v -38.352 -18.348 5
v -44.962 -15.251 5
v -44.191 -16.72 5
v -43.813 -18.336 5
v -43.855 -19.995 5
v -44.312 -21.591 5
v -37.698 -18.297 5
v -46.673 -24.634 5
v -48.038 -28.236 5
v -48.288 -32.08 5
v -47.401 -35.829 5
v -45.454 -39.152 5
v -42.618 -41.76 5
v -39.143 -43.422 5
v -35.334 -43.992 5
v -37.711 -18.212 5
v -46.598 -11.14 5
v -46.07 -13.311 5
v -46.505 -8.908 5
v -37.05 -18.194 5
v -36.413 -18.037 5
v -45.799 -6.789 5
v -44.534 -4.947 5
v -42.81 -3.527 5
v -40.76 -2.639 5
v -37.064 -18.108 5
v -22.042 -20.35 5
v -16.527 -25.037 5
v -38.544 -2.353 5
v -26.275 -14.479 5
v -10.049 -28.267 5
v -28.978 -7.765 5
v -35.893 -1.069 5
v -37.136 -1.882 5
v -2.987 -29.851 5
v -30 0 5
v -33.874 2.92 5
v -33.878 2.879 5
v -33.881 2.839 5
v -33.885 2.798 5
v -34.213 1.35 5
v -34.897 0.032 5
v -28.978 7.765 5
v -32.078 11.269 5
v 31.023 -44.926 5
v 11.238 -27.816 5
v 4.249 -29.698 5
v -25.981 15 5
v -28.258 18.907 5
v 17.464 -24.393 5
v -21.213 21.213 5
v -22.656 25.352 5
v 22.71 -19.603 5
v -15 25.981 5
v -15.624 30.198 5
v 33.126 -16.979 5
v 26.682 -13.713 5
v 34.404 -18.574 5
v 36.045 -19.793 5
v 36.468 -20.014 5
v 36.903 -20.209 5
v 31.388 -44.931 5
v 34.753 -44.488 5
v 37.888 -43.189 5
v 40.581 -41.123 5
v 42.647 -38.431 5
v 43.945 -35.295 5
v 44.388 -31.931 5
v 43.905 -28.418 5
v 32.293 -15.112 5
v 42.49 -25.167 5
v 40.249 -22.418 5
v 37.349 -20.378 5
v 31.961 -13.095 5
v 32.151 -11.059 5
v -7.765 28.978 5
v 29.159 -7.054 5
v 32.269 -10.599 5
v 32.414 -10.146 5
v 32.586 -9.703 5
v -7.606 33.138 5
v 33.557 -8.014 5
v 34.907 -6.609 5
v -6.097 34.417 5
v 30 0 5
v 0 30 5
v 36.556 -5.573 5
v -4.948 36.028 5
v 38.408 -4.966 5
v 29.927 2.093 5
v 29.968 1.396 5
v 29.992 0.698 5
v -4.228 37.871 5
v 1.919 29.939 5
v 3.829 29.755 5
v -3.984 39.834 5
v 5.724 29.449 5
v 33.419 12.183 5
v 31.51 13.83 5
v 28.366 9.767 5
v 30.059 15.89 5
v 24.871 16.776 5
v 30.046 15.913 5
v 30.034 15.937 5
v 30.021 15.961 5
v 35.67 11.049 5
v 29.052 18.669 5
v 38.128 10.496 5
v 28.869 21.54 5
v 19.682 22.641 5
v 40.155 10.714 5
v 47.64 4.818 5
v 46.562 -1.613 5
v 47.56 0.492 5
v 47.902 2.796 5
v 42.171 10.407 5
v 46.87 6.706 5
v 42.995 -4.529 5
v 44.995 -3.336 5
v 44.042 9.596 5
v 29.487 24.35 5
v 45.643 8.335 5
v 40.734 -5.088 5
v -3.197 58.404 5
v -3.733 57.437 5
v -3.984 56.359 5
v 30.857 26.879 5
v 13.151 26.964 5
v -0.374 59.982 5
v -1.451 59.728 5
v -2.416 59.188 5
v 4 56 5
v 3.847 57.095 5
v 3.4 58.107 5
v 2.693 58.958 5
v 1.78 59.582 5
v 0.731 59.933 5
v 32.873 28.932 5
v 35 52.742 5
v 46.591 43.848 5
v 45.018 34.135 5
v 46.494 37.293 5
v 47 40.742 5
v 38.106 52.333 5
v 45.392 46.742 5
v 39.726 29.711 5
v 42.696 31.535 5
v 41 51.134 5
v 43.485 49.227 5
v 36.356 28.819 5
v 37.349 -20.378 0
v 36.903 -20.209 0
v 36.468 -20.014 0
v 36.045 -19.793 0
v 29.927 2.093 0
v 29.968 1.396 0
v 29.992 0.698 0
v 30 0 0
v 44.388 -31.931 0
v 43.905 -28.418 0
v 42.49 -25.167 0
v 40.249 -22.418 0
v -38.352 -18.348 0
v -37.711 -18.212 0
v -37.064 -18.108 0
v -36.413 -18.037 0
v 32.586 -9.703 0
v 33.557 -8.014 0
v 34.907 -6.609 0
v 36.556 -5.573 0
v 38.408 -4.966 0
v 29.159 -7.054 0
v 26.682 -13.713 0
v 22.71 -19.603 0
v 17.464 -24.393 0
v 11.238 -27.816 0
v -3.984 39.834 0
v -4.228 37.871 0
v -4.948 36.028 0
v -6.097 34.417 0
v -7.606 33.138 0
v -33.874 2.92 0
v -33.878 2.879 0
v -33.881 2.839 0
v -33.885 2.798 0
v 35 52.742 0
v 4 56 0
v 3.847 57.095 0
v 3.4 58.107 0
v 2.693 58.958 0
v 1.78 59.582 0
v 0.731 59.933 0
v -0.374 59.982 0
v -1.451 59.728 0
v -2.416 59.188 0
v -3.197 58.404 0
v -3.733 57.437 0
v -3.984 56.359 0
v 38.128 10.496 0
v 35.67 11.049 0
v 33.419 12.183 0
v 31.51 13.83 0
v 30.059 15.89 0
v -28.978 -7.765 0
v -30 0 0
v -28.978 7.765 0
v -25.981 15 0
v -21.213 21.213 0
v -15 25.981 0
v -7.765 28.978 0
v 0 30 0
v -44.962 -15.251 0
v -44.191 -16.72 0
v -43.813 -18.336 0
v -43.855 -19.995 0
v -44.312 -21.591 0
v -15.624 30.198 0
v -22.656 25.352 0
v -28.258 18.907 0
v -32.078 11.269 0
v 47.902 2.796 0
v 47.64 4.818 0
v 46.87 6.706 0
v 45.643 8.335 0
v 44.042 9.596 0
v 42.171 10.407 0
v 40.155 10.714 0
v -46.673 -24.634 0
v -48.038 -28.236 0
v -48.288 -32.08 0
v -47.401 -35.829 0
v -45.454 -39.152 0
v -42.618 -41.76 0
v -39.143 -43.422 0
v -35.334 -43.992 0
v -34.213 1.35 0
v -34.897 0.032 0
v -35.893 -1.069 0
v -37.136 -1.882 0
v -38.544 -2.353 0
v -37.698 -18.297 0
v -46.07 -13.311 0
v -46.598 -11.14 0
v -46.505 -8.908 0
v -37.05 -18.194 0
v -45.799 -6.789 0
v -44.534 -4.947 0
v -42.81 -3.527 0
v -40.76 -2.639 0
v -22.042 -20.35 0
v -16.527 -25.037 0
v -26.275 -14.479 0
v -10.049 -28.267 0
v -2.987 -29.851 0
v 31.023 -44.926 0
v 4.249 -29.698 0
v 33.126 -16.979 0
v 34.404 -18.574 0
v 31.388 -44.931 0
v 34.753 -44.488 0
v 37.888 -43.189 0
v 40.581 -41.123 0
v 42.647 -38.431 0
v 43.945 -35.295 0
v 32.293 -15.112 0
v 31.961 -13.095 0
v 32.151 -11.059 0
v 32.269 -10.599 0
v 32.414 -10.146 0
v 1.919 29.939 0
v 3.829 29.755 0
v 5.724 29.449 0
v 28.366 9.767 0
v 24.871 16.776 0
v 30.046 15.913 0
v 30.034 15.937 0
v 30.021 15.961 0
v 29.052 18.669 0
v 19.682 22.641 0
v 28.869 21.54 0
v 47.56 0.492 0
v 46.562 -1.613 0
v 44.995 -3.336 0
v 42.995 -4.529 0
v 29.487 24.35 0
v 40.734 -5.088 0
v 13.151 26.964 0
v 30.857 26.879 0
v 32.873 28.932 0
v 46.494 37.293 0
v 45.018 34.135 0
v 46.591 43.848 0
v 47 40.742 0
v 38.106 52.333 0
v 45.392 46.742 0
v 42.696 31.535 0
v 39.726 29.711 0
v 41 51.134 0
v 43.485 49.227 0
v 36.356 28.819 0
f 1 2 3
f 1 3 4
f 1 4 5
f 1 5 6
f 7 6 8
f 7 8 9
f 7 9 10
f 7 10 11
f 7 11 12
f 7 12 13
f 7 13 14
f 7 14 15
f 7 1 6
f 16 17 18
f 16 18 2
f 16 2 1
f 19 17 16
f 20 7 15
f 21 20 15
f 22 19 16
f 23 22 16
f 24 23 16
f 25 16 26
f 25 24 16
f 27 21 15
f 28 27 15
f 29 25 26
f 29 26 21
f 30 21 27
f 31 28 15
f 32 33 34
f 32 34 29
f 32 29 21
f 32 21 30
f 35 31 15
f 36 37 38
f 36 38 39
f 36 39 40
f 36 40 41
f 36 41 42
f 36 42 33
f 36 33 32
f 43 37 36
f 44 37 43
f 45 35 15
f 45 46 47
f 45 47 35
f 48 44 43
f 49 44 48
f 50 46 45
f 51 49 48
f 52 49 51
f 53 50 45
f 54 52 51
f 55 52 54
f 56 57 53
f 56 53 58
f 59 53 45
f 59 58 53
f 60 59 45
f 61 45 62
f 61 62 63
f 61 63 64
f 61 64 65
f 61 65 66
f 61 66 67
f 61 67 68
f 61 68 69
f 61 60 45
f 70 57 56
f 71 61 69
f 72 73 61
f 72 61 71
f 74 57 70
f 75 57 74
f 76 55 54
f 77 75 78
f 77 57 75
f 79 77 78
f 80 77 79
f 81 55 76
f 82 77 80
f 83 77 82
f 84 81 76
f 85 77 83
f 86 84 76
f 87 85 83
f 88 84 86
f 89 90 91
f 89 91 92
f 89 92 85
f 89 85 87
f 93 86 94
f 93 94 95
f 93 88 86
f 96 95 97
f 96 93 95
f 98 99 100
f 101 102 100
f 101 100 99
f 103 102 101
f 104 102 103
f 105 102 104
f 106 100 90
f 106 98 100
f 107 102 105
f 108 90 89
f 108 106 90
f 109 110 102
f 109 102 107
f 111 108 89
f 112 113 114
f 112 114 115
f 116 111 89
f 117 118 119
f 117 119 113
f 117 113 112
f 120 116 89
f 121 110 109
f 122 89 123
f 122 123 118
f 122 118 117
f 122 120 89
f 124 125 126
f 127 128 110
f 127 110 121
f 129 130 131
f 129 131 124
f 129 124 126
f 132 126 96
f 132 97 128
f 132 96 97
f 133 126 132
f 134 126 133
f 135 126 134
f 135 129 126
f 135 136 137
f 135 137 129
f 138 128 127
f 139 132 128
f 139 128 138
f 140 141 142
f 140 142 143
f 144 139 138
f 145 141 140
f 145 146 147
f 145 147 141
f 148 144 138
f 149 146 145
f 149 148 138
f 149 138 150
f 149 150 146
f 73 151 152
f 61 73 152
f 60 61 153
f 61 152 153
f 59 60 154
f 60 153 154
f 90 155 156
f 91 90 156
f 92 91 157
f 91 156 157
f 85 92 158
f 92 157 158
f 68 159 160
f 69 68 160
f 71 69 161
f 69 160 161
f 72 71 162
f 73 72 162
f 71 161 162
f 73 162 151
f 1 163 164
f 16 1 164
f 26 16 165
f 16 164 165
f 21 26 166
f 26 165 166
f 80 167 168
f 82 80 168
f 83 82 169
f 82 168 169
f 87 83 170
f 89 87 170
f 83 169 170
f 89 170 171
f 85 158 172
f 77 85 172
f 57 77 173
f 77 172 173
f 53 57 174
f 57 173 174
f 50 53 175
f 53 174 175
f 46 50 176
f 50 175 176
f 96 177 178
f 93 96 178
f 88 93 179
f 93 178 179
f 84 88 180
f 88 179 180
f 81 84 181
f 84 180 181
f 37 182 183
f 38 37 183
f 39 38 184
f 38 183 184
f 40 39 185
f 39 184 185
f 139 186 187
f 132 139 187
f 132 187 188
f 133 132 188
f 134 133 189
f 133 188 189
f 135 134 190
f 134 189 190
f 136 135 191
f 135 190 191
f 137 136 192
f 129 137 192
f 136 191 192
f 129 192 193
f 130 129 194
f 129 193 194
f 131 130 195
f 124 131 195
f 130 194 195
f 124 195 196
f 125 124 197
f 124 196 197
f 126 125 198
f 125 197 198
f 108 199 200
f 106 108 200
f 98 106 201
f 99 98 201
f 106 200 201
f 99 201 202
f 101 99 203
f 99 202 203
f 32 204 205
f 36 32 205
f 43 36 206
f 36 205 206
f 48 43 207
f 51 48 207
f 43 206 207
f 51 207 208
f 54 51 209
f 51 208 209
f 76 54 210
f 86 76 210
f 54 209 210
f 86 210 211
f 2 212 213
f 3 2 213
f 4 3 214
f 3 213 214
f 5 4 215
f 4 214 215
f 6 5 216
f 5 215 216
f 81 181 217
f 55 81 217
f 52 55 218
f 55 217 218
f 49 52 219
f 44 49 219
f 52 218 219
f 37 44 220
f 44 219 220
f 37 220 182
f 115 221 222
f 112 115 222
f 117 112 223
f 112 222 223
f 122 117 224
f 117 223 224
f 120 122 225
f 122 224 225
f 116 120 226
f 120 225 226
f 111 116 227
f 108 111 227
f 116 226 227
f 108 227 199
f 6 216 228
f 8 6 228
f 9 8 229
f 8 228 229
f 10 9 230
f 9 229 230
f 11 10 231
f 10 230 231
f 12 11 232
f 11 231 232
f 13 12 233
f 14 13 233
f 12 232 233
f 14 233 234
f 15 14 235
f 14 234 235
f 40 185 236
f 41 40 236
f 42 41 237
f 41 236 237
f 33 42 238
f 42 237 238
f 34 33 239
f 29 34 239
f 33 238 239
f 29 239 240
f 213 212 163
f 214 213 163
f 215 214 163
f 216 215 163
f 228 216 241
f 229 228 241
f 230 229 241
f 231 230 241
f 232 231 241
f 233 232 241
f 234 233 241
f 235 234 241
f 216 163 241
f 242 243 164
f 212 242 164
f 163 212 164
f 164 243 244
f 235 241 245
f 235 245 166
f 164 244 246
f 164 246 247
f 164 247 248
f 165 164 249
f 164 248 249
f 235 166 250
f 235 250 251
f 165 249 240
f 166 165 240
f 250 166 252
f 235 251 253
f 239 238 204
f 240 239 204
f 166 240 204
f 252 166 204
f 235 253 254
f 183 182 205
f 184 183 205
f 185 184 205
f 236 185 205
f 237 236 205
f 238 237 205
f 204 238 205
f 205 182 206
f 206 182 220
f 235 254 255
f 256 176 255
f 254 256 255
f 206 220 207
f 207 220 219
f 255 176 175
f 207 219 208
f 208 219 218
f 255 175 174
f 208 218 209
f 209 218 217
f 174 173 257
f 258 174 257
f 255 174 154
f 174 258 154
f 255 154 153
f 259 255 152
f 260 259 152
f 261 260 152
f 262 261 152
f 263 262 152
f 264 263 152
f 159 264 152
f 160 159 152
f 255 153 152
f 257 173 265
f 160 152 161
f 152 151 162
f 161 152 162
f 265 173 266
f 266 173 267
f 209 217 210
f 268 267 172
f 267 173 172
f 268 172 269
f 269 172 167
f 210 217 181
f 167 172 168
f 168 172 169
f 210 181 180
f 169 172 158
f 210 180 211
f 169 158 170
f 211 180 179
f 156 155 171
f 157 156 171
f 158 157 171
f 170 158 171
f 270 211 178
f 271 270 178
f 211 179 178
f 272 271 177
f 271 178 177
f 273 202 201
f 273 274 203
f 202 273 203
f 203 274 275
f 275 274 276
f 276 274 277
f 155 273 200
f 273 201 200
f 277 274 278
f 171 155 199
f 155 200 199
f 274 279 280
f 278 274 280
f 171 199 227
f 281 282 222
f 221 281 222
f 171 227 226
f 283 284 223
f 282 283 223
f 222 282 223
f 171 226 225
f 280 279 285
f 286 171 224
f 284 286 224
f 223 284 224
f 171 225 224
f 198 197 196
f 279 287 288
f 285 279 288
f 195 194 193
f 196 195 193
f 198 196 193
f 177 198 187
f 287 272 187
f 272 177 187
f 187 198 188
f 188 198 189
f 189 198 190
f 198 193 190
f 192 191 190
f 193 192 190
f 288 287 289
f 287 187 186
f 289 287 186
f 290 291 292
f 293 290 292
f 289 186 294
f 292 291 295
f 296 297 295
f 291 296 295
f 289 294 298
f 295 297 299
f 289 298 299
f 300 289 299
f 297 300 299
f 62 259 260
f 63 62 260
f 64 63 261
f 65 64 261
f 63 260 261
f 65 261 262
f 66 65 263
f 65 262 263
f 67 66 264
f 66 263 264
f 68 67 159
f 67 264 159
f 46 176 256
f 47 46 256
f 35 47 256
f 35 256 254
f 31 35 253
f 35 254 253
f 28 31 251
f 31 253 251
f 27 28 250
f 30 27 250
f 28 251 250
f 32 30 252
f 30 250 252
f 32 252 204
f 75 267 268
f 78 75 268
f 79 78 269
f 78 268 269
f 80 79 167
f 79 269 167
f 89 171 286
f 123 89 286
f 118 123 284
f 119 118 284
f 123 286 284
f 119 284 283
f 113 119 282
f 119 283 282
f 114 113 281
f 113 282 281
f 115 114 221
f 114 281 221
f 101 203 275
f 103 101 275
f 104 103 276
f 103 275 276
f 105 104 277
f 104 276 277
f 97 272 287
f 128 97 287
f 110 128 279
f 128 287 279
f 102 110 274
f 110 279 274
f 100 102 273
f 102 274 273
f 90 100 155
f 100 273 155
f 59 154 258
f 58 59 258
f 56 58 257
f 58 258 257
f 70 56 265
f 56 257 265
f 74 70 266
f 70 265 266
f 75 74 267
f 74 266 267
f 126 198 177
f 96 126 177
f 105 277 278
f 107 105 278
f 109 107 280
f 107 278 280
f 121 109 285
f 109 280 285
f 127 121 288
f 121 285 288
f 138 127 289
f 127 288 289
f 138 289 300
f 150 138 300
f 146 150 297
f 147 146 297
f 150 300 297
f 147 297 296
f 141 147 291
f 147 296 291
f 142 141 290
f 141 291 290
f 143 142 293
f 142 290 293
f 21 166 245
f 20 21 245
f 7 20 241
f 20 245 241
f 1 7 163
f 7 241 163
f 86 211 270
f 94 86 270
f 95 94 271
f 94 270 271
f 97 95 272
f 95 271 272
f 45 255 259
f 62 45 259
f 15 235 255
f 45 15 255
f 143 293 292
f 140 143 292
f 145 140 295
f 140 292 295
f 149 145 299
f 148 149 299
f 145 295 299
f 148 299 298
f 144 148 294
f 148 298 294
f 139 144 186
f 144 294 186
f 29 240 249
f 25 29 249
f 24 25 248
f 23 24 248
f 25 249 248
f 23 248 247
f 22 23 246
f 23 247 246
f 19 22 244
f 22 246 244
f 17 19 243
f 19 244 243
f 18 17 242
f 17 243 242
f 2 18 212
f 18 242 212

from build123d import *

# Parameters (mm, degrees)
F1_DEPTH = 5


with BuildPart() as f1:
    # F0 (on Top) → F1 (new body)
    with BuildSketch(Plane.XY):
        with BuildLine():
            ThreePointArc((0, 34), (3.2587555857, 33.8434707445), (6.4875058428, 33.3753242372))
            ThreePointArc((6.4875058428, 33.3753242372), (20.2245672544, 27.3306948205), (30.0209102084, 15.9607315076))
            ThreePointArc((30.0209102084, 15.9607315076), (29.0794581658, 22.9667223471), (32.8725193204, 28.9318649833))
            ThreePointArc((32.8725193204, 28.9318649833), (23.0476185494, 41.8097470114), (35, 52.7417687068))
            Line((35, 52.7417687068), (4, 56))
            ThreePointArc((4, 56), (0.179921966, 52.0040485381), (-3.9838140431, 55.6405202785))
            Line((-3.9838140431, 55.6405202785), (-3.9838140431, 39.8343790556))
            ThreePointArc((-3.9838140431, 39.8343790556), (-4.947508544, 36.0277526064), (-7.6064152741, 33.1382324012))
            ThreePointArc((-7.6064152741, 33.1382324012), (-3.8275382662, 33.7838711639), (0, 34))
        make_face()
        with BuildLine():
            ThreePointArc((11.6323598151, 39.2650873379), (10.1766726962, 36.1785890044), (6.8691238336, 35.3385786041))
            ThreePointArc((6.8691238336, 35.3385786041), (5.088046934, 42.3515856715), (11.6323598151, 39.2650873379))
        make_face(mode=Mode.SUBTRACT)
        with BuildLine():
            ThreePointArc((18.9205391147, -28.2491274132), (15.9130639923, -30.0462043256), (12.7366241761, -31.5242510553))
            ThreePointArc((12.7366241761, -31.5242510553), (-7.8635142897, -33.0781671653), (-25.560544226, -22.4200485921))
            ThreePointArc((-25.560544226, -22.4200485921), (-23.167121621, -26.4126243079), (-22.3336934435, -30.9924201643))
            ThreePointArc((-22.3336934435, -30.9924201643), (-26.1413052881, -40.1848083197), (-35.3336934435, -43.9924201643))
            Line((-35.3336934435, -43.9924201643), (31.0227685195, -44.9255836818))
            ThreePointArc((31.0227685195, -44.9255836818), (20.8669341418, -39.5661814055), (18.9205391147, -28.2491274132))
        make_face()
        with BuildLine():
            ThreePointArc((18.9842637366, -37.0873541827), (12.7474921228, -40.4035044729), (13.485837363, -33.3786187644))
            ThreePointArc((13.485837363, -33.3786187644), (17.2210353505, -33.7712038925), (18.9842637366, -37.0873541827))
        make_face(mode=Mode.SUBTRACT)
        with BuildLine():
            ThreePointArc((-22.3336934435, -30.9924201643), (-23.167121621, -26.4126243079), (-25.560544226, -22.4200485921))
            ThreePointArc((-25.560544226, -22.4200485921), (-30.4654264554, -18.9383761734), (-36.4125185886, -18.0372614888))
            ThreePointArc((-36.4125185886, -18.0372614888), (-37.3727380033, -18.2522274842), (-38.3520844578, -18.3476854622))
            ThreePointArc((-38.3520844578, -18.3476854622), (-41.5473016914, -19.573529126), (-44.3119009512, -21.5907293616))
            ThreePointArc((-44.3119009512, -21.5907293616), (-47.4006313408, -35.8286387059), (-35.3336934435, -43.9924201643))
            ThreePointArc((-35.3336934435, -43.9924201643), (-26.1413052881, -40.1848083197), (-22.3336934435, -30.9924201643))
        make_face()
        with BuildLine():
            ThreePointArc((27.9208578423, -19.4016931568), (23.8348146721, -24.2466824441), (18.9205391147, -28.2491274132))
            ThreePointArc((18.9205391147, -28.2491274132), (20.8669341418, -39.5661814055), (31.0227685195, -44.9255836818))
            Line((31.0227685195, -44.9255836818), (31.3883313218, -44.9307245507))
            ThreePointArc((31.3883313218, -44.9307245507), (40.5807194772, -41.1231127061), (44.3883313218, -31.9307245507))
            ThreePointArc((44.3883313218, -31.9307245507), (42.4899554696, -25.1665585799), (37.3492634325, -20.3779201997))
            ThreePointArc((37.3492634325, -20.3779201997), (36.6841658821, -20.1148620294), (36.0452212927, -19.7934523778))
            ThreePointArc((36.0452212927, -19.7934523778), (32.0144676642, -18.9458120257), (27.9208578423, -19.4016931568))
        make_face()
        with BuildLine():
            ThreePointArc((35, 52.7417687068), (23.0476185494, 41.8097470114), (32.8725193204, 28.9318649833))
            ThreePointArc((32.8725193204, 28.9318649833), (42.6964352737, 31.5349840304), (47, 40.7417687068))
            ThreePointArc((47, 40.7417687068), (43.4852813742, 49.227050081), (35, 52.7417687068))
        make_face()
        with BuildLine():
            Line((-30.9096264413, -8.2822094433), (-28.9777747887, -7.7645713531))
            ThreePointArc((-28.9777747887, -7.7645713531), (-23.8006002087, 18.2628428703), (0, 30))
            Line((0, 30), (0, 34))
            ThreePointArc((0, 34), (-3.8275382662, 33.7838711639), (-7.6064152741, 33.1382324012))
            ThreePointArc((-7.6064152741, 33.1382324012), (-25.660218261, 22.3059005377), (-33.8743660313, 2.920158553))
            ThreePointArc((-33.8743660313, 2.920158553), (-33.8791997031, 2.859033117), (-33.8846780738, 2.7979620864))
            ThreePointArc((-33.8846780738, 2.7979620864), (-33.9945520092, -0.6086326428), (-33.7628054009, -4.0091110564))
            ThreePointArc((-33.7628054009, -4.0091110564), (-31.9838278865, -5.9103681889), (-30.9096264413, -8.2822094433))
        make_face()
        with BuildLine():
            Line((12.7366241761, -31.5242510553), (11.2381978025, -27.815515637))
            ThreePointArc((11.2381978025, -27.815515637), (-13.3859343933, -26.8480308481), (-28.9777747887, -7.7645713531))
            Line((-28.9777747887, -7.7645713531), (-30.9096264413, -8.2822094433))
            ThreePointArc((-30.9096264413, -8.2822094433), (-30.7054741606, -9.3085522663), (-30.6370330516, -10.3527618041))
            ThreePointArc((-30.6370330516, -10.3527618041), (-30.7902425374, -11.9109269517), (-31.2440027084, -13.409410679))
            ThreePointArc((-31.2440027084, -13.409410679), (-28.7573823045, -18.1387144802), (-25.560544226, -22.4200485921))
            ThreePointArc((-25.560544226, -22.4200485921), (-7.8635142897, -33.0781671653), (12.7366241761, -31.5242510553))
        make_face()
        with BuildLine():
            ThreePointArc((-31.2440027084, -13.409410679), (-32.1255230387, -11.133317991), (-32.8414780938, -8.7998475335))
            ThreePointArc((-32.8414780938, -8.7998475335), (-33.3881780569, -6.4210253107), (-33.7628054009, -4.0091110564))
            ThreePointArc((-33.7628054009, -4.0091110564), (-36.0190923418, -2.7932389064), (-38.5440935464, -2.3533016818))
            ThreePointArc((-38.5440935464, -2.3533016818), (-45.7991682525, -6.7885200385), (-44.9624546785, -15.2506226884))
            ThreePointArc((-44.9624546785, -15.2506226884), (-42.0311129081, -17.597085232), (-38.3520844578, -18.3476854622))
            ThreePointArc((-38.3520844578, -18.3476854622), (-37.388172897, -18.1557884341), (-36.4125185886, -18.0372614888))
            ThreePointArc((-36.4125185886, -18.0372614888), (-33.3005039545, -16.3127498239), (-31.2440027084, -13.409410679))
        make_face()
        with BuildLine():
            ThreePointArc((-34.6370330516, -10.3527618041), (-42.6028124971, -10.874866573), (-34.7733297464, -9.3174856237))
            ThreePointArc((-34.7733297464, -9.3174856237), (-34.6712536061, -9.8306570352), (-34.6370330516, -10.3527618041))
        make_face(mode=Mode.SUBTRACT)
        with BuildLine():
            ThreePointArc((33.271358913, 7.0011910473), (33.6739196359, 4.6975670679), (33.9171777088, 2.3717201073))
            ThreePointArc((33.9171777088, 2.3717201073), (33.9792881186, 1.1865828879), (34, 0))
            ThreePointArc((34, 0), (33.9804798474, -1.1519502322), (33.9219418037, -2.3025777442))
            ThreePointArc((33.9219418037, -2.3025777442), (35.9392211989, -4.0141594109), (38.4076591967, -4.9658640978))
            ThreePointArc((38.4076591967, -4.9658640978), (44.995072344, -3.3359059143), (47.9023668124, 2.7958486899))
            ThreePointArc((47.9023668124, 2.7958486899), (44.883440045, 9.0171896164), (38.1281928152, 10.4955794883))
            ThreePointArc((38.1281928152, 10.4955794883), (35.3570903597, 9.2246822233), (33.271358913, 7.0011910473))
        make_face()
        with BuildLine():
            ThreePointArc((43.9025620104, 2.7902589498), (40.0421599972, -1.2073043583), (35.9123058094, 2.5112330548))
            ThreePointArc((35.9123058094, 2.5112330548), (39.7629640236, 6.7878222578), (43.9025620104, 2.7902589498))
        make_face(mode=Mode.SUBTRACT)
        with BuildLine():
            ThreePointArc((5.7242698613, 29.4488155034), (22.4686716237, 19.8786014465), (29.9269215078, 2.0926942123))
            Line((29.9269215078, 2.0926942123), (32.0819236255, 2.2433866401))
            ThreePointArc((32.0819236255, 2.2433866401), (32.2990926681, 4.7166747391), (33.271358913, 7.0011910473))
            ThreePointArc((33.271358913, 7.0011910473), (31.9753518136, 11.5575462965), (30.0586464994, 15.8895491007))
            ThreePointArc((30.0586464994, 15.8895491007), (30.0397994382, 15.9251514817), (30.0209102084, 15.9607315076))
            ThreePointArc((30.0209102084, 15.9607315076), (20.2245672544, 27.3306948205), (6.4875058428, 33.3753242372))
            Line((6.4875058428, 33.3753242372), (5.7242698613, 29.4488155034))
        make_face()
        with BuildLine():
            ThreePointArc((29.9269215078, 2.0926942123), (29.9817248106, 1.0469849011), (30, 0))
            ThreePointArc((30, 0), (24.8711271767, -16.7757871041), (11.2381978025, -27.815515637))
            Line((11.2381978025, -27.815515637), (12.7366241761, -31.5242510553))
            ThreePointArc((12.7366241761, -31.5242510553), (15.9130639923, -30.0462043256), (18.9205391147, -28.2491274132))
            ThreePointArc((18.9205391147, -28.2491274132), (22.2750198295, -22.6599342044), (27.9208578423, -19.4016931568))
            ThreePointArc((27.9208578423, -19.4016931568), (30.324201903, -15.3766959697), (32.1510538984, -11.0593730936))
            ThreePointArc((32.1510538984, -11.0593730936), (32.3383257047, -10.3714194358), (32.5861056385, -9.7028717046))
            ThreePointArc((32.5861056385, -9.7028717046), (33.4592465743, -6.0397697541), (33.9219418037, -2.3025777442))
            ThreePointArc((33.9219418037, -2.3025777442), (32.6411943682, -0.1756075), (32.0819236255, 2.2433866401))
            Line((32.0819236255, 2.2433866401), (29.9269215078, 2.0926942123))
        make_face()
        with BuildLine():
            ThreePointArc((43.9025620104, 2.7902589498), (39.7629640236, 6.7878222578), (35.9123058094, 2.5112330548))
            ThreePointArc((35.9123058094, 2.5112330548), (40.0421599972, -1.2073043583), (43.9025620104, 2.7902589498))
        make_face()
        with BuildLine():
            ThreePointArc((11.6323598151, 39.2650873379), (5.088046934, 42.3515856715), (6.8691238336, 35.3385786041))
            ThreePointArc((6.8691238336, 35.3385786041), (10.1766726962, 36.1785890044), (11.6323598151, 39.2650873379))
        make_face()
        with BuildLine():
            ThreePointArc((-34.6370330516, -10.3527618041), (-34.6712536061, -9.8306570352), (-34.7733297464, -9.3174856237))
            ThreePointArc((-34.7733297464, -9.3174856237), (-42.6028124971, -10.874866573), (-34.6370330516, -10.3527618041))
        make_face()
        with BuildLine():
            ThreePointArc((18.9842637366, -37.0873541827), (17.2210353505, -33.7712038925), (13.485837363, -33.3786187644))
            ThreePointArc((13.485837363, -33.3786187644), (12.7474921228, -40.4035044729), (18.9842637366, -37.0873541827))
        make_face()
        with BuildLine():
            Line((-3.9838140431, 56.3594797215), (-3.9838140431, 55.6405202785))
            ThreePointArc((-3.9838140431, 55.6405202785), (0.179921966, 52.0040485381), (4, 56))
            ThreePointArc((4, 56), (0.179921966, 59.9959514619), (-3.9838140431, 56.3594797215))
        make_face()
        with BuildLine():
            ThreePointArc((0, 30), (2.8753725756, 29.861885951), (5.7242698613, 29.4488155034))
            Line((5.7242698613, 29.4488155034), (6.4875058428, 33.3753242372))
            ThreePointArc((6.4875058428, 33.3753242372), (3.2587555857, 33.8434707445), (0, 34))
            Line((0, 34), (0, 30))
        make_face()
        with BuildLine():
            ThreePointArc((27.9208578423, -19.4016931568), (22.2750198295, -22.6599342044), (18.9205391147, -28.2491274132))
            ThreePointArc((18.9205391147, -28.2491274132), (23.8348146721, -24.2466824441), (27.9208578423, -19.4016931568))
        make_face()
        with BuildLine():
            ThreePointArc((32.1510538984, -11.0593730936), (30.324201903, -15.3766959697), (27.9208578423, -19.4016931568))
            ThreePointArc((27.9208578423, -19.4016931568), (32.0144676642, -18.9458120257), (36.0452212927, -19.7934523778))
            ThreePointArc((36.0452212927, -19.7934523778), (32.6494824226, -16.0723086059), (32.1510538984, -11.0593730936))
        make_face()
        with BuildLine():
            ThreePointArc((-36.4125185886, -18.0372614888), (-30.4654264554, -18.9383761734), (-25.560544226, -22.4200485921))
            ThreePointArc((-25.560544226, -22.4200485921), (-28.7573823045, -18.1387144802), (-31.2440027084, -13.409410679))
            ThreePointArc((-31.2440027084, -13.409410679), (-33.3005039545, -16.3127498239), (-36.4125185886, -18.0372614888))
        make_face()
        with BuildLine():
            ThreePointArc((30.0586464994, 15.8895491007), (31.9753518136, 11.5575462965), (33.271358913, 7.0011910473))
            ThreePointArc((33.271358913, 7.0011910473), (35.3570903597, 9.2246822233), (38.1281928152, 10.4955794883))
            ThreePointArc((38.1281928152, 10.4955794883), (33.4188280477, 12.1833542638), (30.0586464994, 15.8895491007))
        make_face()
        with BuildLine():
            ThreePointArc((38.4076591967, -4.9658640978), (35.9392211989, -4.0141594109), (33.9219418037, -2.3025777442))
            ThreePointArc((33.9219418037, -2.3025777442), (33.4592465743, -6.0397697541), (32.5861056385, -9.7028717046))
            ThreePointArc((32.5861056385, -9.7028717046), (34.9069028696, -6.6093115318), (38.4076591967, -4.9658640978))
        make_face()
        with BuildLine():
            ThreePointArc((-44.3119009512, -21.5907293616), (-41.5473016914, -19.573529126), (-38.3520844578, -18.3476854622))
            ThreePointArc((-38.3520844578, -18.3476854622), (-42.0311129081, -17.597085232), (-44.9624546785, -15.2506226884))
            ThreePointArc((-44.9624546785, -15.2506226884), (-43.8132056909, -18.3361288456), (-44.3119009512, -21.5907293616))
        make_face()
        with BuildLine():
            ThreePointArc((-38.5440935464, -2.3533016818), (-36.0190923418, -2.7932389064), (-33.7628054009, -4.0091110564))
            ThreePointArc((-33.7628054009, -4.0091110564), (-33.9945520092, -0.6086326428), (-33.8846780738, 2.7979620864))
            ThreePointArc((-33.8846780738, 2.7979620864), (-35.3600413453, -0.5504405191), (-38.5440935464, -2.3533016818))
        make_face()
        with BuildLine():
            Line((-32.8414780938, -8.7998475335), (-30.9096264413, -8.2822094433))
            ThreePointArc((-30.9096264413, -8.2822094433), (-31.9838278865, -5.9103681889), (-33.7628054009, -4.0091110564))
            ThreePointArc((-33.7628054009, -4.0091110564), (-33.3881780569, -6.4210253107), (-32.8414780938, -8.7998475335))
        make_face()
        with BuildLine():
            ThreePointArc((-30.6370330516, -10.3527618041), (-30.7054741606, -9.3085522663), (-30.9096264413, -8.2822094433))
            Line((-30.9096264413, -8.2822094433), (-32.8414780938, -8.7998475335))
            ThreePointArc((-32.8414780938, -8.7998475335), (-32.1255230387, -11.133317991), (-31.2440027084, -13.409410679))
            ThreePointArc((-31.2440027084, -13.409410679), (-30.7902425374, -11.9109269517), (-30.6370330516, -10.3527618041))
        make_face()
        with BuildLine():
            Line((33.9171777088, 2.3717201073), (32.0819236255, 2.2433866401))
            ThreePointArc((32.0819236255, 2.2433866401), (32.6411943682, -0.1756075), (33.9219418037, -2.3025777442))
            ThreePointArc((33.9219418037, -2.3025777442), (33.9804798474, -1.1519502322), (34, 0))
            ThreePointArc((34, 0), (33.9792881186, 1.1865828879), (33.9171777088, 2.3717201073))
        make_face()
        with BuildLine():
            ThreePointArc((33.271358913, 7.0011910473), (32.2990926681, 4.7166747391), (32.0819236255, 2.2433866401))
            Line((32.0819236255, 2.2433866401), (33.9171777088, 2.3717201073))
            ThreePointArc((33.9171777088, 2.3717201073), (33.6739196359, 4.6975670679), (33.271358913, 7.0011910473))
        make_face()
    extrude(amount=F1_DEPTH)


solid = f1.part
